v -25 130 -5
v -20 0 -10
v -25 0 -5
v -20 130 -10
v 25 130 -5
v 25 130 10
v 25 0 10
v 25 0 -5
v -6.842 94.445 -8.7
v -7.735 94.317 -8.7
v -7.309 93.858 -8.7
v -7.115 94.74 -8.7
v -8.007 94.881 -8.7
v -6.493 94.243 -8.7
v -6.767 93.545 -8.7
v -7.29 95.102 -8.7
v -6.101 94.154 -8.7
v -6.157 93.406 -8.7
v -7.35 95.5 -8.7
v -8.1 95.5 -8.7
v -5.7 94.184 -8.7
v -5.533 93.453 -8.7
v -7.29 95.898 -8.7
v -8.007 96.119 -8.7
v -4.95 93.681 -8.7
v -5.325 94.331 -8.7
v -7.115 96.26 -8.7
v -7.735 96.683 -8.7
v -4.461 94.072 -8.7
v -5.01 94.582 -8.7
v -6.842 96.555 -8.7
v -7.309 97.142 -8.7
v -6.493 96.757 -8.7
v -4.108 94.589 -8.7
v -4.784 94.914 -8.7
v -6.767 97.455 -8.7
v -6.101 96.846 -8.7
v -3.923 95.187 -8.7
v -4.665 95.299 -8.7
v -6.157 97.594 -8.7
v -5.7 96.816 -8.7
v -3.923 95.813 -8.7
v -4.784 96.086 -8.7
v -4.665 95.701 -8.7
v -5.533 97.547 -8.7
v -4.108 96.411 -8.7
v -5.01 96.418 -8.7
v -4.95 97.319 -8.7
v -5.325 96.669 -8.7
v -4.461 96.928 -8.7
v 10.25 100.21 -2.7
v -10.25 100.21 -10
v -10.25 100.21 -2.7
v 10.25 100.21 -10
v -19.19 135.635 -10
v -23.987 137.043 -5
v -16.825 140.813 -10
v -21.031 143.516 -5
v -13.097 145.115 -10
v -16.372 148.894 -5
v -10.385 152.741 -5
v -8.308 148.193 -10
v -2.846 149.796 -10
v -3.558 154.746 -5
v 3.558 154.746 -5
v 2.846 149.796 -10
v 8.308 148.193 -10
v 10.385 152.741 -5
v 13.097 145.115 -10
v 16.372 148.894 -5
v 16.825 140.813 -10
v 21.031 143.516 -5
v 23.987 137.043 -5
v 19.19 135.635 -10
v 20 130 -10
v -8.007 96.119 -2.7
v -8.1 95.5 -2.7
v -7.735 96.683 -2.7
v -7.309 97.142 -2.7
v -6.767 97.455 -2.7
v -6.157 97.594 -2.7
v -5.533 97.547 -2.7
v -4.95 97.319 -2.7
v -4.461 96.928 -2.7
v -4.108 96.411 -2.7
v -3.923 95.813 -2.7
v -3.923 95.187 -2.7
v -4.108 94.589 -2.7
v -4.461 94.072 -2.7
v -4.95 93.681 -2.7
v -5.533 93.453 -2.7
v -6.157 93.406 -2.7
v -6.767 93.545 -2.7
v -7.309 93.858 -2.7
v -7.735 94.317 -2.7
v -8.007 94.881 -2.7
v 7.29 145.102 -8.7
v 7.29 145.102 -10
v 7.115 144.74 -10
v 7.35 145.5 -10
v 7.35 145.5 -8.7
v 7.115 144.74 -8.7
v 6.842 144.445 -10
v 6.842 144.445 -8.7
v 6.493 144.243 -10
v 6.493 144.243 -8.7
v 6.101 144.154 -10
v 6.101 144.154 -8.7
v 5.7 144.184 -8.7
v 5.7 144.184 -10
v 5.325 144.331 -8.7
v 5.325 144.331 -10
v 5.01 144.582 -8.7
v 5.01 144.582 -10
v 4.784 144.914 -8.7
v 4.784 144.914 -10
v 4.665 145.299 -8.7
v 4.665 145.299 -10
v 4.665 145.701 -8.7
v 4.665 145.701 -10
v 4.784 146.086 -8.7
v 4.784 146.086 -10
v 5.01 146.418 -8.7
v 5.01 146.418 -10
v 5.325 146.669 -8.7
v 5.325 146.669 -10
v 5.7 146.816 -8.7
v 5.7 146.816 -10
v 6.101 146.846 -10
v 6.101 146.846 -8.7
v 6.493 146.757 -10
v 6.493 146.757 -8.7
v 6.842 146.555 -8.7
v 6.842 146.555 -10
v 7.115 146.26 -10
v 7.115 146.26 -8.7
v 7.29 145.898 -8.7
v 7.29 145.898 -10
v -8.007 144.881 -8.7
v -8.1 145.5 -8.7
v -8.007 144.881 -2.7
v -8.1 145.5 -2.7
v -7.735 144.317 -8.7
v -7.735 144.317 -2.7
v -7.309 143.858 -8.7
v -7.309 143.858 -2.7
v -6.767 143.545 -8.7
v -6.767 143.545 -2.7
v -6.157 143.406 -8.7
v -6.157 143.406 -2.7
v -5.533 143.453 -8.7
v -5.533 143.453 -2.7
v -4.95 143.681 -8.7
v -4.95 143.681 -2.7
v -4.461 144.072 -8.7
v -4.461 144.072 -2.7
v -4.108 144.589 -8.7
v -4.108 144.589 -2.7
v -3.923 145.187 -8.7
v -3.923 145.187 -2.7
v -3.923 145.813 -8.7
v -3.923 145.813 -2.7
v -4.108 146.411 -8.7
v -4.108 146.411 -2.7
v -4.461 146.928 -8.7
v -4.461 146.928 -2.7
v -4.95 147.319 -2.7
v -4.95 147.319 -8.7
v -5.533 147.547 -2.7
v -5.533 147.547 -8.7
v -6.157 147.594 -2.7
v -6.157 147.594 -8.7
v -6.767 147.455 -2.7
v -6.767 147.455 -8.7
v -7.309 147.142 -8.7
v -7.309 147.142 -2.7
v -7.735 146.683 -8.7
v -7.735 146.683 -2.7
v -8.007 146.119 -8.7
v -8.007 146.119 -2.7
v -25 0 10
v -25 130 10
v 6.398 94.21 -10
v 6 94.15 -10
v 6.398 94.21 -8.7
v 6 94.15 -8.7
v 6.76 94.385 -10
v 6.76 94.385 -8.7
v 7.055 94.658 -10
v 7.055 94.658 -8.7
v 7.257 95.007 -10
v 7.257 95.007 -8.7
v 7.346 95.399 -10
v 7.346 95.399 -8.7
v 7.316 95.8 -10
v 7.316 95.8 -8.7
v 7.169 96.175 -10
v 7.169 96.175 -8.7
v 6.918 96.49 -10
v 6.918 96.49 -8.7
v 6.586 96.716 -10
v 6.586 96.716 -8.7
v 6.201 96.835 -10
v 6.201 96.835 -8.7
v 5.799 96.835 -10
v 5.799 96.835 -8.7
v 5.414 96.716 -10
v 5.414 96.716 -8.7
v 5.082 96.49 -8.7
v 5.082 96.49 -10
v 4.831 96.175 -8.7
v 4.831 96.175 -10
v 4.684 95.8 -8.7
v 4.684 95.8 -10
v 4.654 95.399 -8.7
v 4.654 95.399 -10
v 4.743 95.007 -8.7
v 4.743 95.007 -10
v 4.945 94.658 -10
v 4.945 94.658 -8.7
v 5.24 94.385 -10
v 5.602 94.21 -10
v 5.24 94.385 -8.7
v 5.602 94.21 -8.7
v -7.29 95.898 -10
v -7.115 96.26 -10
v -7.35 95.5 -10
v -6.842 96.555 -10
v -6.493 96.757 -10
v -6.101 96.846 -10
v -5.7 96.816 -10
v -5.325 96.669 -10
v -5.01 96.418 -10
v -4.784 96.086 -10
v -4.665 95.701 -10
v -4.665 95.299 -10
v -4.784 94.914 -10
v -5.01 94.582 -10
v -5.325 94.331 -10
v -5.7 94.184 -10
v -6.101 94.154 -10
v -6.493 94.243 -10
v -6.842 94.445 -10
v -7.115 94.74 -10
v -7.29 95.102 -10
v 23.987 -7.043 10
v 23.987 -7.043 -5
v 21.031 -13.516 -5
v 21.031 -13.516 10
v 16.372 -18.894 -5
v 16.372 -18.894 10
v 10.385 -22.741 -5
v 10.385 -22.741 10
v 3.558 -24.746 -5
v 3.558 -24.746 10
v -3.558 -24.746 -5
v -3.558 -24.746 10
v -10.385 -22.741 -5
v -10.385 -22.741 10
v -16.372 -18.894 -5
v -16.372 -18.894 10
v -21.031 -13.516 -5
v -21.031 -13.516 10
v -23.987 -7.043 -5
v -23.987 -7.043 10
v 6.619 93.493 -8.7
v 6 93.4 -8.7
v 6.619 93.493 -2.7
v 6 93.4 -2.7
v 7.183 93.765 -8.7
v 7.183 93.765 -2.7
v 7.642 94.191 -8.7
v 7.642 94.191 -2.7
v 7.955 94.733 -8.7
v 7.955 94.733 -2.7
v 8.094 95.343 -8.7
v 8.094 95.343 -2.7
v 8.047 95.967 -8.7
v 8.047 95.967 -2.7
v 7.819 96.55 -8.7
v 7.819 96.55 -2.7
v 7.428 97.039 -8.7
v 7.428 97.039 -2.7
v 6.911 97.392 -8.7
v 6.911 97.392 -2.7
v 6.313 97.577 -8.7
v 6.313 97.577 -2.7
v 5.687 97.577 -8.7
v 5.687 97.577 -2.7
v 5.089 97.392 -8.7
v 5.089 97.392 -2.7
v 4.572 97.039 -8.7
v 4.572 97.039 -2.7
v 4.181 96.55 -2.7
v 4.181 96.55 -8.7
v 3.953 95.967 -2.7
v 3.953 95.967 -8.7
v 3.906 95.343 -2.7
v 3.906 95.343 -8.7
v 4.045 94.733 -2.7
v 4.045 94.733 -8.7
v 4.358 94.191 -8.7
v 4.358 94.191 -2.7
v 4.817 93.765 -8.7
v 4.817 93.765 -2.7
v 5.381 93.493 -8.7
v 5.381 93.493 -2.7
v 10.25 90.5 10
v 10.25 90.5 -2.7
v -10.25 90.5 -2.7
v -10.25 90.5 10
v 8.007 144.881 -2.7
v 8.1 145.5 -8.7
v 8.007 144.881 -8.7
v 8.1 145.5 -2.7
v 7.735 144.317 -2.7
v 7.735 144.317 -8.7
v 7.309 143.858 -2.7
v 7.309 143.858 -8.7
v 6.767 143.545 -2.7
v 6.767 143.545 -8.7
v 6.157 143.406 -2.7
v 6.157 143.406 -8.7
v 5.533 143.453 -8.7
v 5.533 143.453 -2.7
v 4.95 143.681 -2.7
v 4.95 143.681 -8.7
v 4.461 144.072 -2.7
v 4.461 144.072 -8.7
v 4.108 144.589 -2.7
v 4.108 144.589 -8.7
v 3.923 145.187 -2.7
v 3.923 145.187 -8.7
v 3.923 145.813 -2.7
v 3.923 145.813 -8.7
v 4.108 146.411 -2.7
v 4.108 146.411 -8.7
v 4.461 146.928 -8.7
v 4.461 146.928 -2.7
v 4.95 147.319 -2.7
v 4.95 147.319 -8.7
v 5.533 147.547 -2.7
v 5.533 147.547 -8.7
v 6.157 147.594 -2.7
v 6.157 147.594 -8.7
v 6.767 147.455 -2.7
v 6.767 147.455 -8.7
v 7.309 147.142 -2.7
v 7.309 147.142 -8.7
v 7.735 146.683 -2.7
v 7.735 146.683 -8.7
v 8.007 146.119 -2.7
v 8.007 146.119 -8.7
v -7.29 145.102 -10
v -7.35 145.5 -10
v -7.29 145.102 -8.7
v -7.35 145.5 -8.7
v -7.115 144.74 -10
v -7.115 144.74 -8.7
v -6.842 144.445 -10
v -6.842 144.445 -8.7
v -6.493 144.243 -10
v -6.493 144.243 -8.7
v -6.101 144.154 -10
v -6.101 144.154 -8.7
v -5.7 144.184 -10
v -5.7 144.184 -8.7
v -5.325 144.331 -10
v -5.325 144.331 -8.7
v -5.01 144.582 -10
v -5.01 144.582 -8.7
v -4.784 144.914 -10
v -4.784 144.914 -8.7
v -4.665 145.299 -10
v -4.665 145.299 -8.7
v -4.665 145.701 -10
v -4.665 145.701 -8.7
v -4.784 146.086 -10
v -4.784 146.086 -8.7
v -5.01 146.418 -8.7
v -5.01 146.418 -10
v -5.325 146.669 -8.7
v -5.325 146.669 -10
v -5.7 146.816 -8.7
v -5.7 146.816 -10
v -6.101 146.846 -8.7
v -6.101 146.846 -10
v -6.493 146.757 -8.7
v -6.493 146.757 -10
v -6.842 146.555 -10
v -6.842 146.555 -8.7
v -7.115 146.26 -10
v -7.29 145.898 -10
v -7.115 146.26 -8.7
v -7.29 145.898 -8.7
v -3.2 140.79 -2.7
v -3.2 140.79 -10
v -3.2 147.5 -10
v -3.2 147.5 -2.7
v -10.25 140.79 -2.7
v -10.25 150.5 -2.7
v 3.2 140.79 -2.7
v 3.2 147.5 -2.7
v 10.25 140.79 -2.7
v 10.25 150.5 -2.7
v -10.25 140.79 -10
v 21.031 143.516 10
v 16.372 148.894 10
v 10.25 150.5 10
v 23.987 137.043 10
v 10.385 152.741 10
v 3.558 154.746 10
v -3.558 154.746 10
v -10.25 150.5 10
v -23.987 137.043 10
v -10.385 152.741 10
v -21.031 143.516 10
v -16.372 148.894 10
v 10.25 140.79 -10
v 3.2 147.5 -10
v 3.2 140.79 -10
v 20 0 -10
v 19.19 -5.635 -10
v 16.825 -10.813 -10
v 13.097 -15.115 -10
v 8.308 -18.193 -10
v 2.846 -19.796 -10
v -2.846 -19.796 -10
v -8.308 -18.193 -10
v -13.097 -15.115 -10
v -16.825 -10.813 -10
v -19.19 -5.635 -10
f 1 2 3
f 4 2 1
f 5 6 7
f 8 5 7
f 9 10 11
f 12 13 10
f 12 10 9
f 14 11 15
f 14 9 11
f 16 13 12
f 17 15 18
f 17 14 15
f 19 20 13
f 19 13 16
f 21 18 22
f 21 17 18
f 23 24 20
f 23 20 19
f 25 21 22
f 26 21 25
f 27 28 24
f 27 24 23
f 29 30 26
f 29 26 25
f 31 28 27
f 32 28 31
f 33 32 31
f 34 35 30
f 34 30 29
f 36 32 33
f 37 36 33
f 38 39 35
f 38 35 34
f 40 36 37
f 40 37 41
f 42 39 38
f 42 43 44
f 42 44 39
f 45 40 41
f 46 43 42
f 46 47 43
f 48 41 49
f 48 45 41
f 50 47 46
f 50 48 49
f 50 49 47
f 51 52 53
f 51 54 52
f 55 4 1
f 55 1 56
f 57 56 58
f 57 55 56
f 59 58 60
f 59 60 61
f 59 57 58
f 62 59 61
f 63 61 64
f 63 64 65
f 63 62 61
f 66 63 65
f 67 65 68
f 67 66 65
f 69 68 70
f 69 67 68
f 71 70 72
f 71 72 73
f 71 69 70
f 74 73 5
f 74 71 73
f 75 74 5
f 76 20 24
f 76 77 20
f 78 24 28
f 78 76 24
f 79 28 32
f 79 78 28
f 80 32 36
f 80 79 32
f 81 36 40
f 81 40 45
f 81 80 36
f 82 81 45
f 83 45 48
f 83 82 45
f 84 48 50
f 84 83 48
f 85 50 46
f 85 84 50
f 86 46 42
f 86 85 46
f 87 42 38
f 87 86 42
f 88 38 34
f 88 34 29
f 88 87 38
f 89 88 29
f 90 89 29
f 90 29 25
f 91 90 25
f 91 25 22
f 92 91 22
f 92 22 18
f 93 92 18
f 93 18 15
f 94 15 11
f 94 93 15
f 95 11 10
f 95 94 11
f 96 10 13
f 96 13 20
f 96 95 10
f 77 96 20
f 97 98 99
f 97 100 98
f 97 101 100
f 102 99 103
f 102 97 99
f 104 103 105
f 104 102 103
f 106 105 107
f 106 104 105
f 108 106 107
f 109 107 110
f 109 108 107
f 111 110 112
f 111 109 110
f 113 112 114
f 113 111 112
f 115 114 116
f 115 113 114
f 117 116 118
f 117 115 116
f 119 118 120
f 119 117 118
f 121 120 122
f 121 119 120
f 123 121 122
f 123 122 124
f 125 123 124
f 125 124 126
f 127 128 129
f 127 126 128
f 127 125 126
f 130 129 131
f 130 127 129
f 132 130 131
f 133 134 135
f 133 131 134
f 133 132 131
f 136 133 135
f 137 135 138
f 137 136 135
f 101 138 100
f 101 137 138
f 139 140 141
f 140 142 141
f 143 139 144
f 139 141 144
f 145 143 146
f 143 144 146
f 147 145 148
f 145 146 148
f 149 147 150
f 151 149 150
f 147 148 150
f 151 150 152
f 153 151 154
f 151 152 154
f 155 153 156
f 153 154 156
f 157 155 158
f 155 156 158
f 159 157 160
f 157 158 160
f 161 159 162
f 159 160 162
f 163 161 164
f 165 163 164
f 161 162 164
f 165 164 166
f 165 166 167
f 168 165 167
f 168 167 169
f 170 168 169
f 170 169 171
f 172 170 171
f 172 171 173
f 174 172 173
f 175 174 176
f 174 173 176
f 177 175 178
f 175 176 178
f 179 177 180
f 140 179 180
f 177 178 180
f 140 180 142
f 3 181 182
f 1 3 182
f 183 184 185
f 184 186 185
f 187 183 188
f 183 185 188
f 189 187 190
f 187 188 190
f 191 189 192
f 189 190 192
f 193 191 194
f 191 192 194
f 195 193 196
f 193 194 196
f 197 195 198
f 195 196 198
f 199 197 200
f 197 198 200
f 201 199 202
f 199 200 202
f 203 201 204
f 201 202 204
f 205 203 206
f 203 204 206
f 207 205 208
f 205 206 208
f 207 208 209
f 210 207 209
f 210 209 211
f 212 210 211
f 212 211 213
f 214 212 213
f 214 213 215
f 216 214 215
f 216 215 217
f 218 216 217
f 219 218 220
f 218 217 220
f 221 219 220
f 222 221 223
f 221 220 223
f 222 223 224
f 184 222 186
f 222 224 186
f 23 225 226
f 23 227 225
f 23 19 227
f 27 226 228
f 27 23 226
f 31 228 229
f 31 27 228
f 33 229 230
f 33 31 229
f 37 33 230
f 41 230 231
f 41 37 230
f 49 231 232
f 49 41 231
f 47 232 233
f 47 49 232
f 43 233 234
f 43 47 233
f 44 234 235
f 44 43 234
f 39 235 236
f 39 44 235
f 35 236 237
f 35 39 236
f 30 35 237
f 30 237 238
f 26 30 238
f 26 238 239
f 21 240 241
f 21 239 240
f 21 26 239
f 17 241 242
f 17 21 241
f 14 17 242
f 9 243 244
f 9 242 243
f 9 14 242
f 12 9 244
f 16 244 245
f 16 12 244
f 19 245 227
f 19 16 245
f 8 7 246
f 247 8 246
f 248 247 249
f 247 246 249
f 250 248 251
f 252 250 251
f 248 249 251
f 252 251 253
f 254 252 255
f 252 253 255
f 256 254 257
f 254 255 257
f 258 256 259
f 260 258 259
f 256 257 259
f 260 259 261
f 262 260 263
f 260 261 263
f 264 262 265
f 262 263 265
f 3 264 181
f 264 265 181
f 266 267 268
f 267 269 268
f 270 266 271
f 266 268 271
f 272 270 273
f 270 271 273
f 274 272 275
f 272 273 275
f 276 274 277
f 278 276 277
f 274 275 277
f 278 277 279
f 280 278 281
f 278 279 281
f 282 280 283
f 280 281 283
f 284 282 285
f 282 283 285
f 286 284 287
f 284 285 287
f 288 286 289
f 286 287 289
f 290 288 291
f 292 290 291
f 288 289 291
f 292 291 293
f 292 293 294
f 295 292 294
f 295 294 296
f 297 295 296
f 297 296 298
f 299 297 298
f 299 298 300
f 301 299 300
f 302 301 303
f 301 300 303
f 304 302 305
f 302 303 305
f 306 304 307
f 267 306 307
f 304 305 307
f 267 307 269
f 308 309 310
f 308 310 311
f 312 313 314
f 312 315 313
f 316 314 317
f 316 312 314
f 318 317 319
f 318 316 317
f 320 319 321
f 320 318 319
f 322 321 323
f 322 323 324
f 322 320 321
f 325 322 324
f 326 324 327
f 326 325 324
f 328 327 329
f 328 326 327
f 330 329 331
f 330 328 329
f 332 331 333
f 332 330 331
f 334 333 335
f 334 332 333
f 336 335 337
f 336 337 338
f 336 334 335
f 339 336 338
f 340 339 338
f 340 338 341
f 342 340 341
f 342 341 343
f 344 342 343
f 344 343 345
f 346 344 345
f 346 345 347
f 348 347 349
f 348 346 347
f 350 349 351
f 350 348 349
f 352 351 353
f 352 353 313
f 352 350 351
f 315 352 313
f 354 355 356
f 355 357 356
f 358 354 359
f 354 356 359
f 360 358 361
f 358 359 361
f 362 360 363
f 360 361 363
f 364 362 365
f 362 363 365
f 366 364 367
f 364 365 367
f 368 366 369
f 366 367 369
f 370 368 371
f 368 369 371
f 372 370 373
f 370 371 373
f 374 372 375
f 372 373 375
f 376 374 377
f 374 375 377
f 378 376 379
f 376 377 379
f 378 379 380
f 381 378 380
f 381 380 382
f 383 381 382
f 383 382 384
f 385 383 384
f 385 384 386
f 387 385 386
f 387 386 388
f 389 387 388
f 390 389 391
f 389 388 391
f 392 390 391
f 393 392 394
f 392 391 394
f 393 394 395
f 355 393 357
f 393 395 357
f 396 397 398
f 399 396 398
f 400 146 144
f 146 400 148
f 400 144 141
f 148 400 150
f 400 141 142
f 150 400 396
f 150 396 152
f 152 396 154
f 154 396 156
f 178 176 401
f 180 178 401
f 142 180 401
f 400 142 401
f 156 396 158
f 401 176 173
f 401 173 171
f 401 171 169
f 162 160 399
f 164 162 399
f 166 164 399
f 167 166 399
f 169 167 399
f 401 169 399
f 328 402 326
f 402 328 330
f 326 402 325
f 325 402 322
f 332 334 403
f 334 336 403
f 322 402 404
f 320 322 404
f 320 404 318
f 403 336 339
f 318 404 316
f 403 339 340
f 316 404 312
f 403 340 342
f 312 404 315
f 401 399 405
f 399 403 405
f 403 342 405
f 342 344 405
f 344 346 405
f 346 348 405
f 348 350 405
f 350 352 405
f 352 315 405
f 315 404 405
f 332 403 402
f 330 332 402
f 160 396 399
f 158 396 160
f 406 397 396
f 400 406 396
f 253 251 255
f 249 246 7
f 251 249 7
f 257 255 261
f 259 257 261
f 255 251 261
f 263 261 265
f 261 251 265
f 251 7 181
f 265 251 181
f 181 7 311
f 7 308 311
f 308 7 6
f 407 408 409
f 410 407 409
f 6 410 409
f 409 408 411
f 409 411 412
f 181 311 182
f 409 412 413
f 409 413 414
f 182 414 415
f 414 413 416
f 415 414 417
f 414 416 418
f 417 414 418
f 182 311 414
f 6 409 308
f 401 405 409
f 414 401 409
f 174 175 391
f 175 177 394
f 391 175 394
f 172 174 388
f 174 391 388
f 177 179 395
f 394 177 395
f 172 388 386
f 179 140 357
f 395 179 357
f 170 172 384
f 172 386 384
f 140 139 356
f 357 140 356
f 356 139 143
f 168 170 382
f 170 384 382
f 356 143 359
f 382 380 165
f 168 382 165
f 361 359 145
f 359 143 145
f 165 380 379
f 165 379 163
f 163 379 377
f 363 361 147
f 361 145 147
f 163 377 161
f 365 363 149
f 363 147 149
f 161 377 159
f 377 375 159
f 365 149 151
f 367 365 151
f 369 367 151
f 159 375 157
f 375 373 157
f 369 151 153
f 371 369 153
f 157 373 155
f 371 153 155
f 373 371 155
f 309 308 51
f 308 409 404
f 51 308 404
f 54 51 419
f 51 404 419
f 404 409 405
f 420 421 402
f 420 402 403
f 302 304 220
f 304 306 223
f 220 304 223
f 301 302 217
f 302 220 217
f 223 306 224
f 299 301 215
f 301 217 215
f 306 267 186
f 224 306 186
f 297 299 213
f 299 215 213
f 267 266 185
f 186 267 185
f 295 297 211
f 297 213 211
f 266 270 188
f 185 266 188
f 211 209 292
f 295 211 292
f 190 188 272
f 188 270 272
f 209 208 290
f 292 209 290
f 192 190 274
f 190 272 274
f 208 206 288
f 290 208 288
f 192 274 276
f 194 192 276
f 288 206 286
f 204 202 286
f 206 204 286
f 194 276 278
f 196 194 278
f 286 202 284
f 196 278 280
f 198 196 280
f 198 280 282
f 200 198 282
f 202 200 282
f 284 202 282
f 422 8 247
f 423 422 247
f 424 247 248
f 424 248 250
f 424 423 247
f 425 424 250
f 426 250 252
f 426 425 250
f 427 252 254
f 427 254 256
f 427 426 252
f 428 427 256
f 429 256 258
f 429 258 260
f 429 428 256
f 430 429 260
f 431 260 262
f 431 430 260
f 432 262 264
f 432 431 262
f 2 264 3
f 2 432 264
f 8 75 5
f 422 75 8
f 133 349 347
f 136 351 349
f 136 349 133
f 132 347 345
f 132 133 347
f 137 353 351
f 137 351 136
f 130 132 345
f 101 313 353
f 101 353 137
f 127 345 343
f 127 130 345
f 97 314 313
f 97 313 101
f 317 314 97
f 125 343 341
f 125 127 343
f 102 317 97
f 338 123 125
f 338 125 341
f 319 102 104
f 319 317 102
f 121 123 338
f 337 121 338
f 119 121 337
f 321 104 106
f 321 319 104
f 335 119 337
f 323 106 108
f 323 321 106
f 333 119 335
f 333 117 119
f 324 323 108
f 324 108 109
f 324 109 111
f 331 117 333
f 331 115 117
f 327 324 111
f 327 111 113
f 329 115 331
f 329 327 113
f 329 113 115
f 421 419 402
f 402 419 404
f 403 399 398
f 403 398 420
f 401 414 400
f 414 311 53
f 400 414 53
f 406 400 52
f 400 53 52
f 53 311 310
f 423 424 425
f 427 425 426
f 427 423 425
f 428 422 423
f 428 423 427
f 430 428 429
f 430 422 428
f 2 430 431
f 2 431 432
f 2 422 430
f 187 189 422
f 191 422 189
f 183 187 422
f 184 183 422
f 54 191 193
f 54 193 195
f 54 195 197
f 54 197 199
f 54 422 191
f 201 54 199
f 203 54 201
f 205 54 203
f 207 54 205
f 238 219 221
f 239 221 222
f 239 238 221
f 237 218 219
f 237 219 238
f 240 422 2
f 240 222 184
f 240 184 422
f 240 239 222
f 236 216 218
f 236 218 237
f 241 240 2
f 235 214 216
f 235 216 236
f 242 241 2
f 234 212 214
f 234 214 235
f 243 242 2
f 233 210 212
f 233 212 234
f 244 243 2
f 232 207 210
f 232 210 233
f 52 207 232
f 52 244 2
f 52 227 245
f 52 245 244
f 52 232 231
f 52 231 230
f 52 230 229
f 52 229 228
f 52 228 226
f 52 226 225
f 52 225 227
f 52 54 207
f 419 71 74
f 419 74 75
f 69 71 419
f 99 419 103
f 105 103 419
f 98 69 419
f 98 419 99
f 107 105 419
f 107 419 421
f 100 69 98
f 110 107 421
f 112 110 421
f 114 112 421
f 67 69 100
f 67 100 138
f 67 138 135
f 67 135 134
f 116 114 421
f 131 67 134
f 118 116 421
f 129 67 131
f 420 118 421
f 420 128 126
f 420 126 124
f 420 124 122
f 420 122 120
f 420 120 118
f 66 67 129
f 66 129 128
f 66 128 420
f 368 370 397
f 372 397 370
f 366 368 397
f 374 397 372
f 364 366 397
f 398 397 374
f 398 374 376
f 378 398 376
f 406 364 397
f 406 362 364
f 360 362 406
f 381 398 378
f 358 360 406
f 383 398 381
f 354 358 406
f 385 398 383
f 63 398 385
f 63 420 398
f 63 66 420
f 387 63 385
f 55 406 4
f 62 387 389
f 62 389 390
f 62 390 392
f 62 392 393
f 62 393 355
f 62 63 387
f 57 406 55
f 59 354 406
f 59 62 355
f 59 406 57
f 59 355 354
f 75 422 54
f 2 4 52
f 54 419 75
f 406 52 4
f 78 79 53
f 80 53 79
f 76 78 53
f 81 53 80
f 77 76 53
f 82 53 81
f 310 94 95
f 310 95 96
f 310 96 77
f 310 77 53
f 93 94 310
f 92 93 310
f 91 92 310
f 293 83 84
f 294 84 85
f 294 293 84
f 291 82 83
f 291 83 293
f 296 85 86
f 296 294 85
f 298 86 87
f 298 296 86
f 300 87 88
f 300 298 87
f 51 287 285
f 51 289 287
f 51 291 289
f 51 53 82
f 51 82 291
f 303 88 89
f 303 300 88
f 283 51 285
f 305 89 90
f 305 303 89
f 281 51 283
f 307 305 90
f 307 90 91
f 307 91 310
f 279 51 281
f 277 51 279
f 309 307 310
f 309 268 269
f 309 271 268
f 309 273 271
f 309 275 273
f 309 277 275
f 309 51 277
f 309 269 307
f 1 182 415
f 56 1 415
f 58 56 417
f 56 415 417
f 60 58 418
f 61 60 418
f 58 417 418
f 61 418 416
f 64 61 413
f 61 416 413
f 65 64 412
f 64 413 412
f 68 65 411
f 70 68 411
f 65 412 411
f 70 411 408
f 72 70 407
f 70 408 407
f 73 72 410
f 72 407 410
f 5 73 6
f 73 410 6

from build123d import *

# Parameters (mm, degrees)
BOSS_EXTRUDE1_DEPTH = 10
CHAMFER1_SIZE       = 5
CUT_EXTRUDE1_DEPTH  = 10.25
SKETCH5_W           = 6.4
SKETCH5_H           = 6.71
CUT_EXTRUDE2_DEPTH  = 24


with BuildPart() as part:
    # Sketch1 → Boss-Extrude1 (new, symmetric)
    with BuildSketch(Plane.XY):
        with BuildLine():
            Line((25, 130), (25, 0))
            ThreePointArc((25, 0), (0, -25), (-25, 0))
            Line((-25, 0), (-25, 130))
            ThreePointArc((-25, 130), (0, 155), (25, 130))
        make_face()
    extrude(amount=BOSS_EXTRUDE1_DEPTH, both=True)

    # Chamfer1
    chamfer1_edges = [part.edges().sort_by_distance(p)[0] for p in [
        (25, 65, -10),
        (0, -25, -10),
        (-25, 65, -10),
        (0, 155, -10),
    ]]
    chamfer(chamfer1_edges, length=CHAMFER1_SIZE)

    # Sketch3 → Cut-Extrude1 (cut, symmetric)
    with BuildSketch(Plane(origin=(0, 0, 0), x_dir=(0, 0, -1), z_dir=(1, 0, 0))):
        Polygon((2.7, 140.79), (2.7, 150.5), (-10, 150.5), (-10, 120.5), (10, 120.5), (10, 140.79), align=None)
    cut_extrude1 = extrude(amount=CUT_EXTRUDE1_DEPTH, both=True, mode=Mode.SUBTRACT)

    # Sketch4 → Cut-Revolve1 (revolve, cut)
    with BuildSketch(Plane(origin=(-6, 0, 0), x_dir=(0, 0, -1), z_dir=(1, 0, 0)), mode=Mode.PRIVATE) as cut_revolve1_sk:
        Polygon((2.7, 145.5), (12.7, 145.5), (12.7, 146.85), (8.7, 146.85), (8.7, 147.6), (2.7, 147.6), align=None)
    cut_revolve1 = revolve(cut_revolve1_sk.sketch.rotate(Axis((-6, 145.5, -58.145818423), (0, 0, 1)), 90), axis=Axis((-6, 145.5, -58.145818423), (0, 0, 1)), mode=Mode.SUBTRACT)

    # Mirror1: Cut-Revolve1 across plane
    add(cut_revolve1.mirror(Plane(origin=(0, 0, 0), x_dir=(0, 0, 1), z_dir=(1, 0, 0))), mode=Mode.SUBTRACT)

    # Mirror2: Cut-Extrude1, Cut-Revolve1 across plane
    add(cut_extrude1.mirror(Plane(origin=(-10.25, 120.5, -10), x_dir=(0, 0, 1), z_dir=(0, -1, 0))), mode=Mode.SUBTRACT)
    add(cut_revolve1.mirror(Plane(origin=(-10.25, 120.5, -10), x_dir=(0, 0, 1), z_dir=(0, -1, 0))), mode=Mode.SUBTRACT)

    # Mirror2 copy 1 sketch → Mirror2 copy 1 (revolve, cut)
    with BuildSketch(Plane(origin=(6, 241, 0), x_dir=(0, 0, -1), z_dir=(-1, 0, 0))):
        Polygon((2.7, 145.5), (12.7, 145.5), (12.7, 146.85), (8.7, 146.85), (8.7, 147.6), (2.7, 147.6), align=None)
    revolve(axis=Axis((6, 95.5, -58.145818423), (0, 0, 1)), mode=Mode.SUBTRACT)

    # Sketch5 → Cut-Extrude2 (cut)
    with BuildSketch(Plane.XY.offset(-2.7)):
        with Locations((0, 144.145)):
            Rectangle(SKETCH5_W, SKETCH5_H)
    extrude(amount=-CUT_EXTRUDE2_DEPTH, mode=Mode.SUBTRACT)


solid = part.part
